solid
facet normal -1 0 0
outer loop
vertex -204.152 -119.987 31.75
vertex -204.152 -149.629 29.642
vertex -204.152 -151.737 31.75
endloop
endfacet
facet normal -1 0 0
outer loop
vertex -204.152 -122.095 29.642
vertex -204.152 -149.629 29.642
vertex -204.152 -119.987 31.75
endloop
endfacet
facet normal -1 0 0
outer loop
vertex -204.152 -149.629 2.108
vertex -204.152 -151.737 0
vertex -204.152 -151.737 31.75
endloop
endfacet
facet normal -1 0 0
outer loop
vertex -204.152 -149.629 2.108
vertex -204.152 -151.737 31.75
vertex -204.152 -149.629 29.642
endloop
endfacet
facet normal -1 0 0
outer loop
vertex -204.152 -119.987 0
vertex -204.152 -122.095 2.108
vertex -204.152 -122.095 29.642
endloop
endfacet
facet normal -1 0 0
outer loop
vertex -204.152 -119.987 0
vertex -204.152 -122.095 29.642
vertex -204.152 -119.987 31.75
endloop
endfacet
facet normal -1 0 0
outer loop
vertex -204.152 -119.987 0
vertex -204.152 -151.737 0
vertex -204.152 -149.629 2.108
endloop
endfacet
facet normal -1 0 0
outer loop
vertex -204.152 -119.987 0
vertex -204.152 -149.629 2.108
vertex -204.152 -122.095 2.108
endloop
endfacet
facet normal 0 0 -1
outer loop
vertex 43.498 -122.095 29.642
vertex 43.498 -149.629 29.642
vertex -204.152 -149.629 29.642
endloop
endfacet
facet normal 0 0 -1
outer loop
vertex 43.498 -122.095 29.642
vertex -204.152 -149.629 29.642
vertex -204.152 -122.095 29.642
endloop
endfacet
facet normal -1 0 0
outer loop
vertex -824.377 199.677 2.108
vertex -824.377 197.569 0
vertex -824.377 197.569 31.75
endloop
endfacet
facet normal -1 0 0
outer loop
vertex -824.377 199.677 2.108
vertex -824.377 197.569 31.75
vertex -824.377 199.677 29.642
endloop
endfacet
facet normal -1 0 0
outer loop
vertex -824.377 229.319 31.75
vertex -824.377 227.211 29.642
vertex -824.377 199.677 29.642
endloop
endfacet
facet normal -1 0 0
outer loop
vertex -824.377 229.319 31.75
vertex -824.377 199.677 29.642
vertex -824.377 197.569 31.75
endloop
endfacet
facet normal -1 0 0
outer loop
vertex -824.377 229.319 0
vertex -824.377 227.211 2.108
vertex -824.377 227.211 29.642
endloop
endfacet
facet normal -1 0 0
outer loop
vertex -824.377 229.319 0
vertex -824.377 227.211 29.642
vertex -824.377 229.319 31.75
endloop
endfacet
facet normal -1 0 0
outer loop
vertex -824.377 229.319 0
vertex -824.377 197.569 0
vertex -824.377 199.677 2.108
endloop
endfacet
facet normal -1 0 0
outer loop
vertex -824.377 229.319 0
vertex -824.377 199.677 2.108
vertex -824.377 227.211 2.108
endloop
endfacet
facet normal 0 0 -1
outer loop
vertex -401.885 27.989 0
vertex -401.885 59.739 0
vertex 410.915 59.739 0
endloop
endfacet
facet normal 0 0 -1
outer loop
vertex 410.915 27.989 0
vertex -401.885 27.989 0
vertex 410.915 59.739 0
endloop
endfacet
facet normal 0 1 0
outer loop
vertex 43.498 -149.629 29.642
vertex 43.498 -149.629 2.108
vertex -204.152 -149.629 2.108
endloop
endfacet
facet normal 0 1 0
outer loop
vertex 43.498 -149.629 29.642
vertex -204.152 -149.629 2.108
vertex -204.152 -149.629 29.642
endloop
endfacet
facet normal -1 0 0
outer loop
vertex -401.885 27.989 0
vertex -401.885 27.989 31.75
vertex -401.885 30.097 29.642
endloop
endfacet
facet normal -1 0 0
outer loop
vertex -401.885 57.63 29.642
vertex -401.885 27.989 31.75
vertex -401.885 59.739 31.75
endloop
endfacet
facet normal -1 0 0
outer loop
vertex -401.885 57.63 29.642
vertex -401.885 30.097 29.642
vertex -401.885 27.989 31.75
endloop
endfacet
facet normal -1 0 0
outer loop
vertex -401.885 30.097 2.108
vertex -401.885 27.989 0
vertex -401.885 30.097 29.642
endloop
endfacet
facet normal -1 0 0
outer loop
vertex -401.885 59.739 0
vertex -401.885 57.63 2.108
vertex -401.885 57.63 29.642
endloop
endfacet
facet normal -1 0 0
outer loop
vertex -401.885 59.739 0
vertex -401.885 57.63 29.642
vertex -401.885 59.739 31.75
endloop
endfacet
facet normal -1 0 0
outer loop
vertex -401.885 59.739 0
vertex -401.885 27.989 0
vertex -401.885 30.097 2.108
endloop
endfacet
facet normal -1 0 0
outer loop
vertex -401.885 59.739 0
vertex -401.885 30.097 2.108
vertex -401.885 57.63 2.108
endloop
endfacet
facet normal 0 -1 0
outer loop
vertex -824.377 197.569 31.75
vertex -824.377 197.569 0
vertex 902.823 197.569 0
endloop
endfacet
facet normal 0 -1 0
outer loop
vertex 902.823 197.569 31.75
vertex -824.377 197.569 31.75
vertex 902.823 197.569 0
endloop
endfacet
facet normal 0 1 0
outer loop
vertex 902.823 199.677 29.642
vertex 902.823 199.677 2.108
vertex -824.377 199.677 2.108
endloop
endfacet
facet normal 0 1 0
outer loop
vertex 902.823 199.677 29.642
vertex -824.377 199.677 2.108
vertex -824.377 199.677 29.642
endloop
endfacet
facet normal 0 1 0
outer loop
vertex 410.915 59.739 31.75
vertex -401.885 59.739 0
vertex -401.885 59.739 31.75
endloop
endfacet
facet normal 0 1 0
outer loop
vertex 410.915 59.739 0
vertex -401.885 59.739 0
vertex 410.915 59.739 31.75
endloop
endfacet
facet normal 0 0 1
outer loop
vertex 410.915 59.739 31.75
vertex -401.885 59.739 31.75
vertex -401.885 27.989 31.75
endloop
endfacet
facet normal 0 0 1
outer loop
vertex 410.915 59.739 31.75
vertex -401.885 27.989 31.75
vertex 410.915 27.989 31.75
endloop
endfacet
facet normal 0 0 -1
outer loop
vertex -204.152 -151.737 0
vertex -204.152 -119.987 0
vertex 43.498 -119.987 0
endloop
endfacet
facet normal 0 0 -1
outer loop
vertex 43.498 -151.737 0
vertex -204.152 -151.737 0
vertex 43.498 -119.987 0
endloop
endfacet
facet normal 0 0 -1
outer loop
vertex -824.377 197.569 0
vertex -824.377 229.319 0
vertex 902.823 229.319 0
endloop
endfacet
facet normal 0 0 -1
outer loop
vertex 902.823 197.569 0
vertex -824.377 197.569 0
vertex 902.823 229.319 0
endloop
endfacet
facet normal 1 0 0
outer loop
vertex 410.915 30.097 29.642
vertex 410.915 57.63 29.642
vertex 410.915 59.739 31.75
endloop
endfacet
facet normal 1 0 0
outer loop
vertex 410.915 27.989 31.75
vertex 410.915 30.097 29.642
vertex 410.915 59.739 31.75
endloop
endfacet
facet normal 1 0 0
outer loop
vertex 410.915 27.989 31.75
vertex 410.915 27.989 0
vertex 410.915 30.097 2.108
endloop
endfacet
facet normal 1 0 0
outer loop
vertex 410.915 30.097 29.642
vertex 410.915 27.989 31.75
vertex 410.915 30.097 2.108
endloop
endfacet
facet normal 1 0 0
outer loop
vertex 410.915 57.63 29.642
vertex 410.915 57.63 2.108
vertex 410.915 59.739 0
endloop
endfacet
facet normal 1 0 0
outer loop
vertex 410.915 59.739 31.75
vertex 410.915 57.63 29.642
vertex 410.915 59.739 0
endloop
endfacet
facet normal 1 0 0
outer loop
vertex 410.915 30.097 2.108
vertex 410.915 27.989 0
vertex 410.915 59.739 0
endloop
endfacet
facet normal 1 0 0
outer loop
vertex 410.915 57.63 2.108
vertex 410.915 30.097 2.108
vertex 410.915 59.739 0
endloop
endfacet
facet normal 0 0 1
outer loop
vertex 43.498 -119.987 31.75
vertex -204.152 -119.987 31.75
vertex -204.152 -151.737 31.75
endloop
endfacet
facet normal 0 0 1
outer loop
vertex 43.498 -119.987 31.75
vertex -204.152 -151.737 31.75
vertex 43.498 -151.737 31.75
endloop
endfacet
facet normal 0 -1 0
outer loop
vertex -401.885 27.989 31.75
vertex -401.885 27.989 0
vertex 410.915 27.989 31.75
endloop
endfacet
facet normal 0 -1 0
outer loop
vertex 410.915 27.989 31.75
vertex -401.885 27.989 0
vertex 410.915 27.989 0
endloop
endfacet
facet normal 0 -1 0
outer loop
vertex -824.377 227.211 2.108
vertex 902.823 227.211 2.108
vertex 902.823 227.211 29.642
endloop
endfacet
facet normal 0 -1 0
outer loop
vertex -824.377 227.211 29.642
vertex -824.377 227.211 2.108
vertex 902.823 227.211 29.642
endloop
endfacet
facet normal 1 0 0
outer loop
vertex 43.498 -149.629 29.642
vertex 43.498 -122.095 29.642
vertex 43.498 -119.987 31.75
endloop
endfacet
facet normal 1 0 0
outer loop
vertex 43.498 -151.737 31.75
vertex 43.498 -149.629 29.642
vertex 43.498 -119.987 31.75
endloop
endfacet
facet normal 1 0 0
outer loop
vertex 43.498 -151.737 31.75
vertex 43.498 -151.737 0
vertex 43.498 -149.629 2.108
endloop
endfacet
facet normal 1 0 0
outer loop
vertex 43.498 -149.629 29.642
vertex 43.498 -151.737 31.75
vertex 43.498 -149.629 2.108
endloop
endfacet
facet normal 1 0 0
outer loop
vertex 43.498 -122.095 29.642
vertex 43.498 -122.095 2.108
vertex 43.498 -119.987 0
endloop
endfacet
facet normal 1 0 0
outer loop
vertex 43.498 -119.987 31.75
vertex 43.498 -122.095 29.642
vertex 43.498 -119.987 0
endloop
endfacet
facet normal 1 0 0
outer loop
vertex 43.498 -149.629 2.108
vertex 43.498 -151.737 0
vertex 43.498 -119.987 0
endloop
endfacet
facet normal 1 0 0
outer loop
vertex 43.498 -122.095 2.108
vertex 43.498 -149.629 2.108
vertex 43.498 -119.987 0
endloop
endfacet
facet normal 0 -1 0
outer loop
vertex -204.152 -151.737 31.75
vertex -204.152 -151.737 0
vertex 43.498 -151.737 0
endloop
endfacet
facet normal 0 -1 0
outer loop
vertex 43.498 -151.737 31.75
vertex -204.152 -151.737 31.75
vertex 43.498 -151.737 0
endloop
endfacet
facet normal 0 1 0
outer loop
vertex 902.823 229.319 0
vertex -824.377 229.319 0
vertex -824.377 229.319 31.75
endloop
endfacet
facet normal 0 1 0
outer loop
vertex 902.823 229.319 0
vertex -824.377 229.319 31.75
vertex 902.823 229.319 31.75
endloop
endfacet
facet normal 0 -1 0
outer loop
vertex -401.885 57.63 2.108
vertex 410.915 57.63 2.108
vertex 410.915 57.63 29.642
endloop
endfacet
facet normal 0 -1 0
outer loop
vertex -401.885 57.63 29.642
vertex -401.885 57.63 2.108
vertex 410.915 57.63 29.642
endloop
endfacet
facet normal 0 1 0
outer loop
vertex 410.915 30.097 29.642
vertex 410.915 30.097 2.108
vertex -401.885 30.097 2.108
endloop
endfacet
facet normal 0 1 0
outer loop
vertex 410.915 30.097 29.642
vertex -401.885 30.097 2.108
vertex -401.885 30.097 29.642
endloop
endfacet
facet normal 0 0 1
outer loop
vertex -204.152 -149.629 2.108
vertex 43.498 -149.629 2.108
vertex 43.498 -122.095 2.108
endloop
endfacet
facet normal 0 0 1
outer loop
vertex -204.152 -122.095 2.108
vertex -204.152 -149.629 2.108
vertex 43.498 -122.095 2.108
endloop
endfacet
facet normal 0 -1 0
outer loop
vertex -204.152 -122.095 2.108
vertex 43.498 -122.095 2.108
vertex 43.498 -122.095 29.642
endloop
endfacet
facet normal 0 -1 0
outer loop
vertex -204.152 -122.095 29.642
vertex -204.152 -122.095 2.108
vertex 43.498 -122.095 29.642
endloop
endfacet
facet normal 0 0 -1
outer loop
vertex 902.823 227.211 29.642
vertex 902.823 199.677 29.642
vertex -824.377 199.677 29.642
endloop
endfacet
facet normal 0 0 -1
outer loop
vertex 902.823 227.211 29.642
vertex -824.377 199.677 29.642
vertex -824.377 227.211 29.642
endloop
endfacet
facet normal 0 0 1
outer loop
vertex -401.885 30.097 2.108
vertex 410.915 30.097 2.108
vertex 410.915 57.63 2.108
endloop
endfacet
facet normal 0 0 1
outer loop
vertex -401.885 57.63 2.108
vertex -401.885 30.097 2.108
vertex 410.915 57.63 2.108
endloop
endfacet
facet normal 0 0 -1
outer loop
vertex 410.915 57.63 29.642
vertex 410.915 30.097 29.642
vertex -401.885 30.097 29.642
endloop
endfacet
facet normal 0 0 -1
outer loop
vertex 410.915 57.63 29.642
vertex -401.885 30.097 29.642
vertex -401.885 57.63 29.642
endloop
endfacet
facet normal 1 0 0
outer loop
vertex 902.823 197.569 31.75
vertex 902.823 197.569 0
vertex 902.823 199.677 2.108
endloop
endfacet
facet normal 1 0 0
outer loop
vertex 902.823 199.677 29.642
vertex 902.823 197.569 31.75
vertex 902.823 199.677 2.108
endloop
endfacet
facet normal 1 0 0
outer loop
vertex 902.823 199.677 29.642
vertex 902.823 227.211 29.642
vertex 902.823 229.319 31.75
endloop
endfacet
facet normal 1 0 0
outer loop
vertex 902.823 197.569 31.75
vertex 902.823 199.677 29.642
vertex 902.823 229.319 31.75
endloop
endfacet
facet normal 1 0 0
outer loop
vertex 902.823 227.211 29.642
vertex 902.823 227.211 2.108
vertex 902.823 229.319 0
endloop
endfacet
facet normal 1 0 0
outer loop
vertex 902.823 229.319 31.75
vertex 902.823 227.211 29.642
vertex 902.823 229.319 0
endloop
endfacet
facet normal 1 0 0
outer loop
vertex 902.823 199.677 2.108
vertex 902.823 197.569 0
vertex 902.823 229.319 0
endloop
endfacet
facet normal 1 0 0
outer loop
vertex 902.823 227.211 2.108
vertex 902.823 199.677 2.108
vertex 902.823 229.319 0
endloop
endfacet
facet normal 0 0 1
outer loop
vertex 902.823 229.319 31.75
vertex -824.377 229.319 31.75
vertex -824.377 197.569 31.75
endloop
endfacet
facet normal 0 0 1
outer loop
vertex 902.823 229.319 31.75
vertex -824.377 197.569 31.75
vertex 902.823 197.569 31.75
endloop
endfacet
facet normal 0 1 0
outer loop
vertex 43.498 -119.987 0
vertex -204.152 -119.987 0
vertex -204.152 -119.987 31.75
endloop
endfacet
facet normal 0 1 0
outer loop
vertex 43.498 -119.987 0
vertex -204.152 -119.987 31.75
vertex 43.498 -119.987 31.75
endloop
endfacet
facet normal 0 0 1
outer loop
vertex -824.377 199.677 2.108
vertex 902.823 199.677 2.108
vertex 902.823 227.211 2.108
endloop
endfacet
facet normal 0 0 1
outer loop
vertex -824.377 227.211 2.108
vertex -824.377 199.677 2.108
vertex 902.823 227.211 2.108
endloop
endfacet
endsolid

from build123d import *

# Parameters (mm, degrees)
F0_W     = 812.8
F0_H     = 31.75
F1_DEPTH = 31.75
F2_W     = 27.5336
F2_H     = 27.5336
F3_DEPTH = 855.472
F0_W_2   = 1727.2
F4_DEPTH = 31.75
F5_W     = 27.5336
F5_H     = 27.5336
F6_DEPTH = 1783.08
F0_W_3   = 247.65
F7_DEPTH = 31.75
F8_W     = 27.5336
F8_H     = 27.5336
F9_DEPTH = 254


with BuildPart() as f1:
    # F0 (on Top) → F1 (new body)
    with BuildSketch(Plane.XY):
        with Locations((4.515211, 43.863674)):
            Rectangle(F0_W, F0_H)
    extrude(amount=F1_DEPTH)

    # F2 (on face) → F3 (cut)
    with BuildSketch(Plane.YZ.offset(410.915211)):
        with Locations((43.863674, 15.875)):
            Rectangle(F2_W, F2_H)
    extrude(amount=-F3_DEPTH, mode=Mode.SUBTRACT)


with BuildPart() as f4:
    # F0 (on Top) → F4 (new body)
    with BuildSketch(Plane.XY):
        with Locations((39.223496, 213.444219)):
            Rectangle(F0_W_2, F0_H)
    extrude(amount=F4_DEPTH)

    # F5 (on face) → F6 (cut)
    with BuildSketch(Plane.YZ.offset(902.823496)):
        with Locations((213.444219, 15.875)):
            Rectangle(F5_W, F5_H)
    extrude(amount=-F6_DEPTH, mode=Mode.SUBTRACT)


with BuildPart() as f7:
    # F0 (on Top) → F7 (new body)
    with BuildSketch(Plane.XY):
        with Locations((-80.327241, -135.861841)):
            Rectangle(F0_W_3, F0_H)
    extrude(amount=F7_DEPTH)

    # F8 (on face) → F9 (cut)
    with BuildSketch(Plane.YZ.offset(43.497759)):
        with Locations((-135.861841, 15.875)):
            Rectangle(F8_W, F8_H)
    extrude(amount=-F9_DEPTH, mode=Mode.SUBTRACT)


solid = Compound([f1.part, f4.part, f7.part])
